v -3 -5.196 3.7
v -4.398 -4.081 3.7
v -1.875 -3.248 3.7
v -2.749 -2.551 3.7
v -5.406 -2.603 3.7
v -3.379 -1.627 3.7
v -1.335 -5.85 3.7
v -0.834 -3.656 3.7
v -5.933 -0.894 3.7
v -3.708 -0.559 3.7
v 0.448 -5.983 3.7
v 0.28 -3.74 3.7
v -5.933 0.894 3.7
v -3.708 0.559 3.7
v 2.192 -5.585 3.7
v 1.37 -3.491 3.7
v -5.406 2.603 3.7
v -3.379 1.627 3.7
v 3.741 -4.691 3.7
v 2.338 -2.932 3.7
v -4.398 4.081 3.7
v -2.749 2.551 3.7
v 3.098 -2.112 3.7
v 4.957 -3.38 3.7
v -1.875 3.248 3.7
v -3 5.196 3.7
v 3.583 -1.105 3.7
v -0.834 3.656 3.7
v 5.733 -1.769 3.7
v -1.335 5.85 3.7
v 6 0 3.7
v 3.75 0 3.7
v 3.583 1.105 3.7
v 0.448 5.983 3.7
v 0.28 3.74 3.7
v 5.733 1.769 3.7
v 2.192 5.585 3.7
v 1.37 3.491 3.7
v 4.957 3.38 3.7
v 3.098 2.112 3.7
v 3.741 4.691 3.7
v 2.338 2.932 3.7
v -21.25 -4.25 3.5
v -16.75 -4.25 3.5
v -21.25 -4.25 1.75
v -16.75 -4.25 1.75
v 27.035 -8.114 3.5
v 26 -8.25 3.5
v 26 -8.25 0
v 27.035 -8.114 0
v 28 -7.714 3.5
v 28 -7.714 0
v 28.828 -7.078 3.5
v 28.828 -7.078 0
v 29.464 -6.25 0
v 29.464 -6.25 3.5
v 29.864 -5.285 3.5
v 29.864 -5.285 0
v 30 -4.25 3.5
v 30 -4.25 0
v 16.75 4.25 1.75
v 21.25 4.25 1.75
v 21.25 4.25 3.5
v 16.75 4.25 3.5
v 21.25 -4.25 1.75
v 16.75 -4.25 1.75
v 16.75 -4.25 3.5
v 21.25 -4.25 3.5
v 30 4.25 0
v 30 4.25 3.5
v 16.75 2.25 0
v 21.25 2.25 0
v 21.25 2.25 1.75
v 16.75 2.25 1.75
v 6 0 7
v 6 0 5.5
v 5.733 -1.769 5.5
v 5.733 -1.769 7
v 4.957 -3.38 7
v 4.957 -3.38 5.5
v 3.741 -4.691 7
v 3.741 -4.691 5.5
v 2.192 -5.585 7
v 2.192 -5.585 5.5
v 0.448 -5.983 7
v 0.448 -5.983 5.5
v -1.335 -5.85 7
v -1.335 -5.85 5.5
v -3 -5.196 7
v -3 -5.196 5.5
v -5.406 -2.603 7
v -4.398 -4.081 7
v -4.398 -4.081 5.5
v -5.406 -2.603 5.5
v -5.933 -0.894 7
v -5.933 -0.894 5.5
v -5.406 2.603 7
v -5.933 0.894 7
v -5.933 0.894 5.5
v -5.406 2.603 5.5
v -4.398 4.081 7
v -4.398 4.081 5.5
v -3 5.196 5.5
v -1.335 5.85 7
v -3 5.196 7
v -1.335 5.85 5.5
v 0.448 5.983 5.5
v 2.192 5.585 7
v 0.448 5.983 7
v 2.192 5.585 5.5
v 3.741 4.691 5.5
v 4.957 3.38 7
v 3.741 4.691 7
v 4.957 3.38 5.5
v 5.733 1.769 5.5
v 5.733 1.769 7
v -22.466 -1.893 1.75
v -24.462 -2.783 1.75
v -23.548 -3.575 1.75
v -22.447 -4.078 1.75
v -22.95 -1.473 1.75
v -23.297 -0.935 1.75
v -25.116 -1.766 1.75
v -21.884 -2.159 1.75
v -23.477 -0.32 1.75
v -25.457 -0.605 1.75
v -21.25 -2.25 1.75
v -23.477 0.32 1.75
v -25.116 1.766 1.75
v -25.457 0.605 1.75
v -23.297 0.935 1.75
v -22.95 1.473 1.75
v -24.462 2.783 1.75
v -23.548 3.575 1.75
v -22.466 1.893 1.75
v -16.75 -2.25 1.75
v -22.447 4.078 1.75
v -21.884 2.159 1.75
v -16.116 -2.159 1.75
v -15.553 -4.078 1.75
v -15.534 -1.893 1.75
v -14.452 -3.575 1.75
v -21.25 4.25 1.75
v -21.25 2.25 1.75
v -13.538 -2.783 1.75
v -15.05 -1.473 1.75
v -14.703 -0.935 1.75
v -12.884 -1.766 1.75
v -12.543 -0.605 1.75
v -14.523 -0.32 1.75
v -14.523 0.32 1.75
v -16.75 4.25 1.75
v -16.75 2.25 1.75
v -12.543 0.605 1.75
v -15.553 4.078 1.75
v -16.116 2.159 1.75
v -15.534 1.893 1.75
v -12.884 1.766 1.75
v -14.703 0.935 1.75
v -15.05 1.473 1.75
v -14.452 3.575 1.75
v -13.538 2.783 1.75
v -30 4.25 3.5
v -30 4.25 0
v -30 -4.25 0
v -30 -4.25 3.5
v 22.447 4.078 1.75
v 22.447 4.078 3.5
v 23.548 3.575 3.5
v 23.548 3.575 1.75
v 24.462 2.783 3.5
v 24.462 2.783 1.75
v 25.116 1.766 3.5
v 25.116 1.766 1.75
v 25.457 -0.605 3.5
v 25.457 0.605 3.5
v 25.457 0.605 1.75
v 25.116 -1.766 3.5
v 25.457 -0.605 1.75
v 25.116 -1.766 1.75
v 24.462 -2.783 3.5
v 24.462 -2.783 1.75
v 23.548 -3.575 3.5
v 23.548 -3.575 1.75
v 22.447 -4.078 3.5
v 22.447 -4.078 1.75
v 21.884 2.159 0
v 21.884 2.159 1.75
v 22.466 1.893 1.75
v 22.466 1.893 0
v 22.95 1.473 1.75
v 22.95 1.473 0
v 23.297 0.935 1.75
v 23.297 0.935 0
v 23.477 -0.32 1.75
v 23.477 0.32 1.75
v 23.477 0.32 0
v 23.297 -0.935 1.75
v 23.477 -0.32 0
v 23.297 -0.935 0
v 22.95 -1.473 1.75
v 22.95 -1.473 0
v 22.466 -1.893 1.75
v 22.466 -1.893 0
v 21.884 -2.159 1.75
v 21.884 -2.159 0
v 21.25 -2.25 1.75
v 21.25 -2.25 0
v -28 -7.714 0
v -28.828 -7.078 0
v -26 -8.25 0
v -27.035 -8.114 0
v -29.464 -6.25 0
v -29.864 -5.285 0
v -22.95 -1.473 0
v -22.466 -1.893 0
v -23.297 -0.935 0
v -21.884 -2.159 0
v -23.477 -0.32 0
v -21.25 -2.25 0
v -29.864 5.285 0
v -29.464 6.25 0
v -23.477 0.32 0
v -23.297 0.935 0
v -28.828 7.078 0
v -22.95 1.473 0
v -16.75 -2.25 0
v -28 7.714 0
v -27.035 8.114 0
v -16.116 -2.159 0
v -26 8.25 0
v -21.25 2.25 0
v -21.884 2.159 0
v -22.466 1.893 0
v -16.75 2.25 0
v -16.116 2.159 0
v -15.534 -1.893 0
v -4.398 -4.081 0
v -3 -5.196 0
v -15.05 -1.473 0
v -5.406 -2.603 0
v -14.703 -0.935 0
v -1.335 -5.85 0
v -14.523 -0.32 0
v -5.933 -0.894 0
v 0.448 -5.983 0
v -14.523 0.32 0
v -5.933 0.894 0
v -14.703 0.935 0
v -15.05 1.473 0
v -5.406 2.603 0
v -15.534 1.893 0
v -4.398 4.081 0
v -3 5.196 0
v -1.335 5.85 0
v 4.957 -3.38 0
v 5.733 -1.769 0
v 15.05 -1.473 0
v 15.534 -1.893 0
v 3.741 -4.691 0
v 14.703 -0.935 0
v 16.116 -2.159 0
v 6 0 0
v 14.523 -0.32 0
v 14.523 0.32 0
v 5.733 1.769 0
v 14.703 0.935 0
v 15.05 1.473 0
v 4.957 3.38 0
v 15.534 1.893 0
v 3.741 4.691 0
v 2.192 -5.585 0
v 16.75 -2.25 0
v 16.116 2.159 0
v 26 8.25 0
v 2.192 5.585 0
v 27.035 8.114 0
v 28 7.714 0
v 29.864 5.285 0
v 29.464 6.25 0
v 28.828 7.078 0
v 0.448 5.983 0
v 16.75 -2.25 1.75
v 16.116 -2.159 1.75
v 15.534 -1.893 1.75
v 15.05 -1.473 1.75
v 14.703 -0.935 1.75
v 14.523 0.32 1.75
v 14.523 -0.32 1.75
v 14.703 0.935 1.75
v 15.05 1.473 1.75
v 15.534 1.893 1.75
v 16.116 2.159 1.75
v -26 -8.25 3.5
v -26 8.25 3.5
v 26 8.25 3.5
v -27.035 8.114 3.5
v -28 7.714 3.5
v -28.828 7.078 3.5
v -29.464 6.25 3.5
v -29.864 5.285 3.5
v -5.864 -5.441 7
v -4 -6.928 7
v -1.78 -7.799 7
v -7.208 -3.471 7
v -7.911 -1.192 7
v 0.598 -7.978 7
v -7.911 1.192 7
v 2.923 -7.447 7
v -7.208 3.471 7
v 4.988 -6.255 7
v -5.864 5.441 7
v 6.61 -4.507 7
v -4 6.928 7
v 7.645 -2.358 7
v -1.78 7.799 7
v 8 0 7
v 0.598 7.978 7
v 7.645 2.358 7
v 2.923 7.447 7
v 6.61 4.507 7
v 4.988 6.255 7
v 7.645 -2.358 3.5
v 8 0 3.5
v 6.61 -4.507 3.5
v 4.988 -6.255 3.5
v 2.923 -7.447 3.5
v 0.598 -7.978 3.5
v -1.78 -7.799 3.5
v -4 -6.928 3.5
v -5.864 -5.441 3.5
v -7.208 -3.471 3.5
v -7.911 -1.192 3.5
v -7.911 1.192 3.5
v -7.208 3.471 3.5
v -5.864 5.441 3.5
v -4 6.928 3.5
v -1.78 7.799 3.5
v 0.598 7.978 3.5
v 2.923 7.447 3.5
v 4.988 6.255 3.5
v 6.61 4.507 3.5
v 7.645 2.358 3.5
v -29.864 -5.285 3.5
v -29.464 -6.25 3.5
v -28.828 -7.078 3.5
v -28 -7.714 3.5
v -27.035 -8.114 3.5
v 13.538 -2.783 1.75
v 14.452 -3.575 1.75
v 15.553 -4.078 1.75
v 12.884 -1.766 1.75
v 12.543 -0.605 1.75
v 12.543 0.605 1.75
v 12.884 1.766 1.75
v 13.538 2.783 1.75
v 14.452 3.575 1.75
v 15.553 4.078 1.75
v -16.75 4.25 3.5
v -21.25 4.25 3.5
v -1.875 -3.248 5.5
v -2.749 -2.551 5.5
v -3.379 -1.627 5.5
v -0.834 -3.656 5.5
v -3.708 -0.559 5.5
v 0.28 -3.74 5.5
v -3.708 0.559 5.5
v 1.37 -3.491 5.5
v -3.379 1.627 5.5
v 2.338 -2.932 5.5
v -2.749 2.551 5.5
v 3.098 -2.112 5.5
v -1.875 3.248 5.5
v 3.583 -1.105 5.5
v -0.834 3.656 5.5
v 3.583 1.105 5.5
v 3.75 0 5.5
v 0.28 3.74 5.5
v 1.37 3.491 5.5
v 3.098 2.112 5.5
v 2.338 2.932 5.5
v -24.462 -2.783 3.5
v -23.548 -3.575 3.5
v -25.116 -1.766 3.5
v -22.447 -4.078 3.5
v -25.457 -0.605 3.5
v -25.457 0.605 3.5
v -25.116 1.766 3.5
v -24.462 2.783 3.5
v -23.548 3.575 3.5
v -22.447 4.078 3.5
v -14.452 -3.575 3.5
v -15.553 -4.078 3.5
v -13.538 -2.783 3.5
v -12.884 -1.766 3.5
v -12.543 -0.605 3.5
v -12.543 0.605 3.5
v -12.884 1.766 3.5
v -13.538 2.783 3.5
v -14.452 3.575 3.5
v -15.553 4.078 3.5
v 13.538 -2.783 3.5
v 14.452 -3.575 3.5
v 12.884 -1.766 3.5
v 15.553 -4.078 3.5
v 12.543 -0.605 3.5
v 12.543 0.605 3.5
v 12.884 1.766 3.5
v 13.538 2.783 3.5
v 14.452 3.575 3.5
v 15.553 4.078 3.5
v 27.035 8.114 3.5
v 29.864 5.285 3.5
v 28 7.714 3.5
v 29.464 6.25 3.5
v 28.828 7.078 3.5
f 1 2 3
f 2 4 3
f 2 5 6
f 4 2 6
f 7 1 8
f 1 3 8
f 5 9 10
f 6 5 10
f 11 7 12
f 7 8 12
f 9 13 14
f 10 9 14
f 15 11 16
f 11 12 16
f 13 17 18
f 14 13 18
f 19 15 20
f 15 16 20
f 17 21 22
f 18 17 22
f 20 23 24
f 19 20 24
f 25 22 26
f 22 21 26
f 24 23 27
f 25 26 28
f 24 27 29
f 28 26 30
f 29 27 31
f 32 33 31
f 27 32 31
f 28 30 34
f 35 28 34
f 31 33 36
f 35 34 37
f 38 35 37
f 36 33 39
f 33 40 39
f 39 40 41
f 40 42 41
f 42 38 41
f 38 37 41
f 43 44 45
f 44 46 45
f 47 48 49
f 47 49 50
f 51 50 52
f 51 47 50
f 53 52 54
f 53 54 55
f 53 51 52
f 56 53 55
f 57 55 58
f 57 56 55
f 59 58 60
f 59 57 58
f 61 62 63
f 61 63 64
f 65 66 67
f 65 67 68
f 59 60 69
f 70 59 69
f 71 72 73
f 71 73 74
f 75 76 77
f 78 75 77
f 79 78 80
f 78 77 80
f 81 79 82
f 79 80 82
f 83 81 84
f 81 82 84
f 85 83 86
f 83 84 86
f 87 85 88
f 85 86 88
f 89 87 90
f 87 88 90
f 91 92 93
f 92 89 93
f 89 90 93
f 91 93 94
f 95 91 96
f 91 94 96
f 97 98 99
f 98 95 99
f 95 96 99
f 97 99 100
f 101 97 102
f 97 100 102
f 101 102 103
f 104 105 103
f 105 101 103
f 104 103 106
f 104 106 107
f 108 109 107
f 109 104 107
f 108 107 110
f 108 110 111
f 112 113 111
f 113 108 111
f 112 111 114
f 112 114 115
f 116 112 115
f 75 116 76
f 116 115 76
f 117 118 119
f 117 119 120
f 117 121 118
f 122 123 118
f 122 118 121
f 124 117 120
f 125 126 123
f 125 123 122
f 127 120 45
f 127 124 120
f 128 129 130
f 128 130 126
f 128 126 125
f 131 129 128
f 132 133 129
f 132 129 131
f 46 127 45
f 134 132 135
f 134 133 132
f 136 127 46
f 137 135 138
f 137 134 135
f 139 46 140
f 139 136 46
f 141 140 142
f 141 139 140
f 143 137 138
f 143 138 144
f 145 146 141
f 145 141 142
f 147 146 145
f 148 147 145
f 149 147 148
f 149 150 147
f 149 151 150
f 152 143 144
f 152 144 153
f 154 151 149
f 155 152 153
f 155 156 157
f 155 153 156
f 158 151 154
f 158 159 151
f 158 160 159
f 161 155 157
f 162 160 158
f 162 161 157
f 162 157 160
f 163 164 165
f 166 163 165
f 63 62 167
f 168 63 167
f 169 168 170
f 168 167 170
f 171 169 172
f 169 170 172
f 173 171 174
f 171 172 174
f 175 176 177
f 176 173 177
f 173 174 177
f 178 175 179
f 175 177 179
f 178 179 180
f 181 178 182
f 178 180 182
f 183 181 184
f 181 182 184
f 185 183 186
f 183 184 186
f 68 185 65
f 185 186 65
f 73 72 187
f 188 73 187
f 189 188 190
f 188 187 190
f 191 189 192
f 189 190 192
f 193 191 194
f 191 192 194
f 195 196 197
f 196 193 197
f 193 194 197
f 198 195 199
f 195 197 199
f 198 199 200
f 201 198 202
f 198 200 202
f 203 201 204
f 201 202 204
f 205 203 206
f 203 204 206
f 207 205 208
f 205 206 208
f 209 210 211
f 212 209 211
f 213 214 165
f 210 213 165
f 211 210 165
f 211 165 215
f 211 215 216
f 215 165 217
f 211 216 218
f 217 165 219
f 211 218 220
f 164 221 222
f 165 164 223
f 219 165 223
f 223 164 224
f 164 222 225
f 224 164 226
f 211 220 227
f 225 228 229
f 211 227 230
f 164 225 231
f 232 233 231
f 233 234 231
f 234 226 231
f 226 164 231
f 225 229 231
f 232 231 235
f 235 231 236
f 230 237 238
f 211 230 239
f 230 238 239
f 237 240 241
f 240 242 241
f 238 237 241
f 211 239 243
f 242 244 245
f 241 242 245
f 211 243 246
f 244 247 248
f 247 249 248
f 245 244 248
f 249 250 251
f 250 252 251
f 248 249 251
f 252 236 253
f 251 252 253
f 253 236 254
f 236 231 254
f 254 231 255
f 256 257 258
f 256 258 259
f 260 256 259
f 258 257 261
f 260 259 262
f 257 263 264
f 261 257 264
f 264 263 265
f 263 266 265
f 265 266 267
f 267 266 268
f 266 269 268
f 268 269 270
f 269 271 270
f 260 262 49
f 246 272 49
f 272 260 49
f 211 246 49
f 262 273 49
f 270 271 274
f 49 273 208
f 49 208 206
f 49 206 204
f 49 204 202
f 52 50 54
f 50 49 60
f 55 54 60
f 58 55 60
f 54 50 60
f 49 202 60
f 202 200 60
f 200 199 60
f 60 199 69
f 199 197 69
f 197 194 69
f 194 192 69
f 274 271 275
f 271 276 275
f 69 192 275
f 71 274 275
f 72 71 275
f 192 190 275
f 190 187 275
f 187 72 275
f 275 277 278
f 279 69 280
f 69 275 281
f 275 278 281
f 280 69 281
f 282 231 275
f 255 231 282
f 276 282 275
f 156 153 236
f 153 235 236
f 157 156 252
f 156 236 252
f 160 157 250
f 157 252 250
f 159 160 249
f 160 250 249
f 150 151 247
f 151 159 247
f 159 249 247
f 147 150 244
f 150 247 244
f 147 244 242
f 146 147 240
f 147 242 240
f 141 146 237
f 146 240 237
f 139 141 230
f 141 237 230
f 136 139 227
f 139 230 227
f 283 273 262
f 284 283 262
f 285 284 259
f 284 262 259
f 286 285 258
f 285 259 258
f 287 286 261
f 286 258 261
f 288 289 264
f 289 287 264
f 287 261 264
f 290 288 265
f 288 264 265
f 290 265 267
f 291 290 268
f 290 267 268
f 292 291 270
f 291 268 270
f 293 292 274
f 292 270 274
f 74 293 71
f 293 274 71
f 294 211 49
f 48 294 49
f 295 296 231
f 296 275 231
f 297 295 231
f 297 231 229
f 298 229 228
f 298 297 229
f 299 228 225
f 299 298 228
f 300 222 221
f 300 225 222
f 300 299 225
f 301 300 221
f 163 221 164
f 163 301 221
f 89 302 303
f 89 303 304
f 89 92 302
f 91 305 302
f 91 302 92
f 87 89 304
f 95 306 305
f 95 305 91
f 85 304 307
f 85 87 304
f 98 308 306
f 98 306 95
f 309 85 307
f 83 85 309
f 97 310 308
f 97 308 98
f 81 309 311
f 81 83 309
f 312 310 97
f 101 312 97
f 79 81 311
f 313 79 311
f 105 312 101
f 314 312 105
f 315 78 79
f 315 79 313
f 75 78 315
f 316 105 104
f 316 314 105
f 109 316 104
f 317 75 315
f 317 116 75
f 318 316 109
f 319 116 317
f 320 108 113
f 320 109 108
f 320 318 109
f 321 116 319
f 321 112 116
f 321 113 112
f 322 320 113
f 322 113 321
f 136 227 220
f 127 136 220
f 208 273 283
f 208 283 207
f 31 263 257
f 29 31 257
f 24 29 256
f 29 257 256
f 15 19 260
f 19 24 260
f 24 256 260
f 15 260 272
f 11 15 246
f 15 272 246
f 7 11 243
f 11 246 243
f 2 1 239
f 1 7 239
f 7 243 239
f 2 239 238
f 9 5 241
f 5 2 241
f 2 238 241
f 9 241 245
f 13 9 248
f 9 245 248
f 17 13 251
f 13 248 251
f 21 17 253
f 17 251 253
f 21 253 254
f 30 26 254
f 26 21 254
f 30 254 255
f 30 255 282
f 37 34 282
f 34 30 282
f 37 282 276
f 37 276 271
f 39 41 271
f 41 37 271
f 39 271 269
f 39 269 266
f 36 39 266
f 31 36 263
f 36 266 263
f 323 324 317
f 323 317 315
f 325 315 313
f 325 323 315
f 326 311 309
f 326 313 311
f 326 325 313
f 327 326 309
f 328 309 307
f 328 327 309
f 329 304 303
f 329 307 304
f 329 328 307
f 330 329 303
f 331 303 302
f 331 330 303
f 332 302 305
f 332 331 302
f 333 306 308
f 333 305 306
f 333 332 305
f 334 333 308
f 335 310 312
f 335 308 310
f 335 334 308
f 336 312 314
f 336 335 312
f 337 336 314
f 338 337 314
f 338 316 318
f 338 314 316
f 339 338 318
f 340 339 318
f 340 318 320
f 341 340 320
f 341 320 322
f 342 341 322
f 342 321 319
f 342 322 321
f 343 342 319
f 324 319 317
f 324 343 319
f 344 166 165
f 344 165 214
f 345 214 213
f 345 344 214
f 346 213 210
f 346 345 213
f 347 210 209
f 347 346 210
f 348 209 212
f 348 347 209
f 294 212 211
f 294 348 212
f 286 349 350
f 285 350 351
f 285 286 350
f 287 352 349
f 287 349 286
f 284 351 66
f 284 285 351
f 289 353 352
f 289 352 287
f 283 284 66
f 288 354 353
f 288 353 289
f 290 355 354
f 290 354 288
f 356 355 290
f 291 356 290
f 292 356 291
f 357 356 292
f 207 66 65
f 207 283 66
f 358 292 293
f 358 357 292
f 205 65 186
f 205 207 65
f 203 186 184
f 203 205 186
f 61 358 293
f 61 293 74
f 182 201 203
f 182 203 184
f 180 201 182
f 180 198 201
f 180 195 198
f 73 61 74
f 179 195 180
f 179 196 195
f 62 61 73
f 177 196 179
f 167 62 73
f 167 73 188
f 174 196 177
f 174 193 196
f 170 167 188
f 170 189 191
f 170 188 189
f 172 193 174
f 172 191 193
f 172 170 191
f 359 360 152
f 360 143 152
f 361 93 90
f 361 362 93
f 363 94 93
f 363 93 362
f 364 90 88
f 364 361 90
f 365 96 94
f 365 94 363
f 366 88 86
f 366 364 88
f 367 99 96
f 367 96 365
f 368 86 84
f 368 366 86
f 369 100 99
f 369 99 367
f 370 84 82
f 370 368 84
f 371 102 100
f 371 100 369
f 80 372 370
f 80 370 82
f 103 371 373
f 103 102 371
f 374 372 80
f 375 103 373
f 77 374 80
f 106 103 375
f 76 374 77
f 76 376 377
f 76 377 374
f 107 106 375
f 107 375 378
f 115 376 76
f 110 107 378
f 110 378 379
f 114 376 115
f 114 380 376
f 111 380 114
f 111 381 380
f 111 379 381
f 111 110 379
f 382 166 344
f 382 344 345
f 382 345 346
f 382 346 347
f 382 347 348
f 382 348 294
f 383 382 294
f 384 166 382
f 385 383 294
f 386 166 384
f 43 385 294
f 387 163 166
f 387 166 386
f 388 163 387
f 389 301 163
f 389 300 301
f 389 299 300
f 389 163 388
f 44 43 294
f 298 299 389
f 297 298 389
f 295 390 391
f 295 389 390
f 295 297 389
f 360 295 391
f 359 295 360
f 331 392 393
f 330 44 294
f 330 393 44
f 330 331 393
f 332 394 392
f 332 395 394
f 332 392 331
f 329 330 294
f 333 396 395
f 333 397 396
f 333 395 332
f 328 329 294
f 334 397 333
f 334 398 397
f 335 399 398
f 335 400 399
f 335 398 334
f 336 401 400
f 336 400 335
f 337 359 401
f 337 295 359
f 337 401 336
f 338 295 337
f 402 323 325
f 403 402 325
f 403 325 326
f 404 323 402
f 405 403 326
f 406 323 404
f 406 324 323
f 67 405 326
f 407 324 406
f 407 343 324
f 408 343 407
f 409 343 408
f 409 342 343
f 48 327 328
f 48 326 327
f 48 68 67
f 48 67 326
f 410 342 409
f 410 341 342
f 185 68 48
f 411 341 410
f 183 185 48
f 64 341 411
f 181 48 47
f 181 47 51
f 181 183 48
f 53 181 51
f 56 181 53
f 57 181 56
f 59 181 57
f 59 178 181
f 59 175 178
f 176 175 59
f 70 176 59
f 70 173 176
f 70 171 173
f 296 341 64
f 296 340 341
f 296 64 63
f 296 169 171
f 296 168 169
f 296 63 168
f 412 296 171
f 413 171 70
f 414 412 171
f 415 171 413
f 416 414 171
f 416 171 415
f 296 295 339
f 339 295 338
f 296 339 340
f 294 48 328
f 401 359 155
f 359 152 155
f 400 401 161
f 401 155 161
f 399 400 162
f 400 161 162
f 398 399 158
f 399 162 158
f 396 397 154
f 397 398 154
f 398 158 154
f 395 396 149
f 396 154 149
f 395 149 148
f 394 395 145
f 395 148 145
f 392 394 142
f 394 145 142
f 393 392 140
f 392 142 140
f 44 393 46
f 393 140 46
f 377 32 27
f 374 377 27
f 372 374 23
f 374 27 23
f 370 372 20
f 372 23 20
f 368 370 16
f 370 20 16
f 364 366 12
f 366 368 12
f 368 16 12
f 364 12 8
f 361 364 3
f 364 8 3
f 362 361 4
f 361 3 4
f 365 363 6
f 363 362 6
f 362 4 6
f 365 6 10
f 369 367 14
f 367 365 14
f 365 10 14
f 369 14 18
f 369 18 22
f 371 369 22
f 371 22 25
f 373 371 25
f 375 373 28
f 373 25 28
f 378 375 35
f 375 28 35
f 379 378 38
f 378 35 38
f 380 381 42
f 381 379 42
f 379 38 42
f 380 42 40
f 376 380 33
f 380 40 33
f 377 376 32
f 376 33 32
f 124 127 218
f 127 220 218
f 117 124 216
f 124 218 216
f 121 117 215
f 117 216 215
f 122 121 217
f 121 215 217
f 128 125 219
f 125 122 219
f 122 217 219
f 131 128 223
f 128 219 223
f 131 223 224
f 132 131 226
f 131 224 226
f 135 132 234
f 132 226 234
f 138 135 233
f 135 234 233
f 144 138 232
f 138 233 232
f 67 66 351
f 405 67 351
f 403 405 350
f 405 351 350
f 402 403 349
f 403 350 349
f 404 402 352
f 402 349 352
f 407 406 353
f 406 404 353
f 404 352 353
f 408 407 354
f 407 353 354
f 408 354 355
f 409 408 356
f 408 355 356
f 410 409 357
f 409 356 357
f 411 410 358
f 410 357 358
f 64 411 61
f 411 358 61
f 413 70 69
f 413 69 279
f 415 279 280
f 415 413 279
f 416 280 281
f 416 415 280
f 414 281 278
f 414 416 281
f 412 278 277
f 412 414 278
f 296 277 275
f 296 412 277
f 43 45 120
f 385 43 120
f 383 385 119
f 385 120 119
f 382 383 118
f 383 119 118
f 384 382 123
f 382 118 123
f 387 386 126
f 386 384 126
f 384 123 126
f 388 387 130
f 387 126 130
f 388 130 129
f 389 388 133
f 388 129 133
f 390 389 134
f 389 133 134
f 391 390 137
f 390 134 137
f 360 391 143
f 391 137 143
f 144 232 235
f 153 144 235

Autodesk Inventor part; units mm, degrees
ref_plane "YZ Plane" through (0, 0, 0) normal (1, 0, 0) x (0, 1, 0)
ref_plane "XZ Plane" through (0, 0, 0) normal (0, 1, 0) x (-1, 0, 0)
ref_plane "XY Plane" through (0, 0, 0) normal (0, 0, 1) x (1, 0, 0)
sketch "skt_base" plane through (0, 0, 0) normal (0, 0, 1) x (1, 0, 0)
  line L0 (-30, -8.25) -> (30, -8.25)
  line L1 (30, -8.25) -> (30, 8.25)
  line L2 (30, 8.25) -> (-30, 8.25)
  line L3 (-30, 8.25) -> (-30, -8.25)
  line L4 (-30, -8.25) -> (30, 8.25) construction
  line L5 (30, -8.25) -> (-30, 8.25) construction
  line L6 (-30, 0) -> (30, 0) construction
  line L7 (0, -8.25) -> (0, 8.25) construction
  line L8 (14.5, 0) -> (23.5, 0) construction
  line L9 (16.75, -2.25) -> (21.25, -2.25)
  line L10 (21.25, 2.25) -> (16.75, 2.25)
  arc A0 (16.75, 2.25) -> (16.75, -2.25) centre (16.75, 0) ccw
  arc A1 (21.25, -2.25) -> (21.25, 2.25) centre (21.25, 0) ccw
  line L11 (12.5, 0) -> (25.5, 0) construction
  line L12 (16.75, -4.25) -> (21.25, -4.25)
  line L13 (21.25, 4.25) -> (16.75, 4.25)
  arc A2 (16.75, 4.25) -> (16.75, -4.25) centre (16.75, 0) ccw
  arc A3 (21.25, -4.25) -> (21.25, 4.25) centre (21.25, 0) ccw
  line L14 (-16.75, -2.25) -> (-21.25, -2.25)
  line L15 (-21.25, 2.25) -> (-16.75, 2.25)
  arc A4 (-16.75, -2.25) -> (-16.75, 2.25) centre (-16.75, 0) ccw
  arc A5 (-21.25, 2.25) -> (-21.25, -2.25) centre (-21.25, 0) ccw
  line L16 (-16.75, -4.25) -> (-21.25, -4.25)
  line L17 (-21.25, 4.25) -> (-16.75, 4.25)
  arc A6 (-16.75, -4.25) -> (-16.75, 4.25) centre (-16.75, 0) ccw
  arc A7 (-21.25, 4.25) -> (-21.25, -4.25) centre (-21.25, 0) ccw
  circle A8 centre (0, 0) radius 3.75
  circle A9 centre (0, 0) radius 6
  circle A10 centre (0, 0) radius 8
  point P0 (0, 0)
  point P1 (19, 0)
  point P2 (19, 0)
  point P3 (0, 0)
  dimension "d13" = 60
  dimension "d14" = 16.5
  dimension "d29" = 6.5
  dimension "d30" = 4.5
  dimension "d31" = 9
  dimension "d32" = 2
  dimension "d33" = 2
  dimension "d47" = 16
  dimension "d48" = 12
  dimension "d49" = 7.5
extrude "base" add sketch "skt_base" along normal blind 3.5 contours L3 L2 L1 L0
extrude "screw_head" add sketch "skt_base" along normal blind 1.75 contours A2 L13 A3 L12 | L16 A7 L17 A6
extrude "handle_support" add sketch "skt_base" along normal blind 7 contours A10
extrude "handle_guide" add sketch "skt_base" along normal blind 5.5 contours A9
extrude "handle_screw_head" cut sketch "skt_base" along normal blind 3.7 contours A9
fillet "side_fillets" radius 4 4 edges at (-30, -8.25, 1.75) (30, -8.25, 1.75) (30, 8.25, 1.75) (-30, 8.25, 1.75)
equation "\"d13\" = base_l"
equation "\"d14\" = base_w"
equation "\"d29\" = base_screw_b"
equation "\"d30\" = base_screw_w"
equation "\"d31\" = base_screw_l"
equation "\"d32\" = base_screw_p"
equation "\"d33\" = base_screw_p"
equation "\"d47\" = handle_screw_e"
equation "\"d48\" = handle_screw_p"
equation "\"d49\" = handle_screw_d"
equation "\"d15\" = base_t"
equation "\"d34\" = base_screw_t"
equation "\"d50\" = handle_screw_h"
equation "\"d52\" = handle_screw_h - handle_screw_b"
equation "\"d54\" = handle_screw_h - 2.2 * handle_screw_b"
equation "\"wall_inner_diam\" = 2"
equation "\"wall_outer_diam\" = 1"
equation "\"wall_height\" = 8"
equation "\"leg_diam\" = 3"
equation "\"leg_height\" = 4"
equation "\"wall_widh\" = 8"
equation "\"base_screw_w\" = 4.5"
equation "\"base_t\" = 3.5"
equation "\"base_w\" = 16.5"
equation "\"base_l\" = 60"
equation "\"base_screw_p\" = 2"
equation "\"base_screw_l\" = 9"
equation "\"base_screw_t\" = 1.75"
equation "\"base_screw_b\" = 6.5"
equation "\"handle_screw_p\" = 12"
equation "\"handle_screw_d\" = 7.5"
equation "\"handle_screw_e\" = 16"
equation "\"handle_screw_b\" = 1.5"
equation "\"handle_screw_h\" = 7"
equation "\"d44\" = 7.5"
equation "\"d45\" = 16"
equation "\"d46\" = 12"
properties part number "coffee"
